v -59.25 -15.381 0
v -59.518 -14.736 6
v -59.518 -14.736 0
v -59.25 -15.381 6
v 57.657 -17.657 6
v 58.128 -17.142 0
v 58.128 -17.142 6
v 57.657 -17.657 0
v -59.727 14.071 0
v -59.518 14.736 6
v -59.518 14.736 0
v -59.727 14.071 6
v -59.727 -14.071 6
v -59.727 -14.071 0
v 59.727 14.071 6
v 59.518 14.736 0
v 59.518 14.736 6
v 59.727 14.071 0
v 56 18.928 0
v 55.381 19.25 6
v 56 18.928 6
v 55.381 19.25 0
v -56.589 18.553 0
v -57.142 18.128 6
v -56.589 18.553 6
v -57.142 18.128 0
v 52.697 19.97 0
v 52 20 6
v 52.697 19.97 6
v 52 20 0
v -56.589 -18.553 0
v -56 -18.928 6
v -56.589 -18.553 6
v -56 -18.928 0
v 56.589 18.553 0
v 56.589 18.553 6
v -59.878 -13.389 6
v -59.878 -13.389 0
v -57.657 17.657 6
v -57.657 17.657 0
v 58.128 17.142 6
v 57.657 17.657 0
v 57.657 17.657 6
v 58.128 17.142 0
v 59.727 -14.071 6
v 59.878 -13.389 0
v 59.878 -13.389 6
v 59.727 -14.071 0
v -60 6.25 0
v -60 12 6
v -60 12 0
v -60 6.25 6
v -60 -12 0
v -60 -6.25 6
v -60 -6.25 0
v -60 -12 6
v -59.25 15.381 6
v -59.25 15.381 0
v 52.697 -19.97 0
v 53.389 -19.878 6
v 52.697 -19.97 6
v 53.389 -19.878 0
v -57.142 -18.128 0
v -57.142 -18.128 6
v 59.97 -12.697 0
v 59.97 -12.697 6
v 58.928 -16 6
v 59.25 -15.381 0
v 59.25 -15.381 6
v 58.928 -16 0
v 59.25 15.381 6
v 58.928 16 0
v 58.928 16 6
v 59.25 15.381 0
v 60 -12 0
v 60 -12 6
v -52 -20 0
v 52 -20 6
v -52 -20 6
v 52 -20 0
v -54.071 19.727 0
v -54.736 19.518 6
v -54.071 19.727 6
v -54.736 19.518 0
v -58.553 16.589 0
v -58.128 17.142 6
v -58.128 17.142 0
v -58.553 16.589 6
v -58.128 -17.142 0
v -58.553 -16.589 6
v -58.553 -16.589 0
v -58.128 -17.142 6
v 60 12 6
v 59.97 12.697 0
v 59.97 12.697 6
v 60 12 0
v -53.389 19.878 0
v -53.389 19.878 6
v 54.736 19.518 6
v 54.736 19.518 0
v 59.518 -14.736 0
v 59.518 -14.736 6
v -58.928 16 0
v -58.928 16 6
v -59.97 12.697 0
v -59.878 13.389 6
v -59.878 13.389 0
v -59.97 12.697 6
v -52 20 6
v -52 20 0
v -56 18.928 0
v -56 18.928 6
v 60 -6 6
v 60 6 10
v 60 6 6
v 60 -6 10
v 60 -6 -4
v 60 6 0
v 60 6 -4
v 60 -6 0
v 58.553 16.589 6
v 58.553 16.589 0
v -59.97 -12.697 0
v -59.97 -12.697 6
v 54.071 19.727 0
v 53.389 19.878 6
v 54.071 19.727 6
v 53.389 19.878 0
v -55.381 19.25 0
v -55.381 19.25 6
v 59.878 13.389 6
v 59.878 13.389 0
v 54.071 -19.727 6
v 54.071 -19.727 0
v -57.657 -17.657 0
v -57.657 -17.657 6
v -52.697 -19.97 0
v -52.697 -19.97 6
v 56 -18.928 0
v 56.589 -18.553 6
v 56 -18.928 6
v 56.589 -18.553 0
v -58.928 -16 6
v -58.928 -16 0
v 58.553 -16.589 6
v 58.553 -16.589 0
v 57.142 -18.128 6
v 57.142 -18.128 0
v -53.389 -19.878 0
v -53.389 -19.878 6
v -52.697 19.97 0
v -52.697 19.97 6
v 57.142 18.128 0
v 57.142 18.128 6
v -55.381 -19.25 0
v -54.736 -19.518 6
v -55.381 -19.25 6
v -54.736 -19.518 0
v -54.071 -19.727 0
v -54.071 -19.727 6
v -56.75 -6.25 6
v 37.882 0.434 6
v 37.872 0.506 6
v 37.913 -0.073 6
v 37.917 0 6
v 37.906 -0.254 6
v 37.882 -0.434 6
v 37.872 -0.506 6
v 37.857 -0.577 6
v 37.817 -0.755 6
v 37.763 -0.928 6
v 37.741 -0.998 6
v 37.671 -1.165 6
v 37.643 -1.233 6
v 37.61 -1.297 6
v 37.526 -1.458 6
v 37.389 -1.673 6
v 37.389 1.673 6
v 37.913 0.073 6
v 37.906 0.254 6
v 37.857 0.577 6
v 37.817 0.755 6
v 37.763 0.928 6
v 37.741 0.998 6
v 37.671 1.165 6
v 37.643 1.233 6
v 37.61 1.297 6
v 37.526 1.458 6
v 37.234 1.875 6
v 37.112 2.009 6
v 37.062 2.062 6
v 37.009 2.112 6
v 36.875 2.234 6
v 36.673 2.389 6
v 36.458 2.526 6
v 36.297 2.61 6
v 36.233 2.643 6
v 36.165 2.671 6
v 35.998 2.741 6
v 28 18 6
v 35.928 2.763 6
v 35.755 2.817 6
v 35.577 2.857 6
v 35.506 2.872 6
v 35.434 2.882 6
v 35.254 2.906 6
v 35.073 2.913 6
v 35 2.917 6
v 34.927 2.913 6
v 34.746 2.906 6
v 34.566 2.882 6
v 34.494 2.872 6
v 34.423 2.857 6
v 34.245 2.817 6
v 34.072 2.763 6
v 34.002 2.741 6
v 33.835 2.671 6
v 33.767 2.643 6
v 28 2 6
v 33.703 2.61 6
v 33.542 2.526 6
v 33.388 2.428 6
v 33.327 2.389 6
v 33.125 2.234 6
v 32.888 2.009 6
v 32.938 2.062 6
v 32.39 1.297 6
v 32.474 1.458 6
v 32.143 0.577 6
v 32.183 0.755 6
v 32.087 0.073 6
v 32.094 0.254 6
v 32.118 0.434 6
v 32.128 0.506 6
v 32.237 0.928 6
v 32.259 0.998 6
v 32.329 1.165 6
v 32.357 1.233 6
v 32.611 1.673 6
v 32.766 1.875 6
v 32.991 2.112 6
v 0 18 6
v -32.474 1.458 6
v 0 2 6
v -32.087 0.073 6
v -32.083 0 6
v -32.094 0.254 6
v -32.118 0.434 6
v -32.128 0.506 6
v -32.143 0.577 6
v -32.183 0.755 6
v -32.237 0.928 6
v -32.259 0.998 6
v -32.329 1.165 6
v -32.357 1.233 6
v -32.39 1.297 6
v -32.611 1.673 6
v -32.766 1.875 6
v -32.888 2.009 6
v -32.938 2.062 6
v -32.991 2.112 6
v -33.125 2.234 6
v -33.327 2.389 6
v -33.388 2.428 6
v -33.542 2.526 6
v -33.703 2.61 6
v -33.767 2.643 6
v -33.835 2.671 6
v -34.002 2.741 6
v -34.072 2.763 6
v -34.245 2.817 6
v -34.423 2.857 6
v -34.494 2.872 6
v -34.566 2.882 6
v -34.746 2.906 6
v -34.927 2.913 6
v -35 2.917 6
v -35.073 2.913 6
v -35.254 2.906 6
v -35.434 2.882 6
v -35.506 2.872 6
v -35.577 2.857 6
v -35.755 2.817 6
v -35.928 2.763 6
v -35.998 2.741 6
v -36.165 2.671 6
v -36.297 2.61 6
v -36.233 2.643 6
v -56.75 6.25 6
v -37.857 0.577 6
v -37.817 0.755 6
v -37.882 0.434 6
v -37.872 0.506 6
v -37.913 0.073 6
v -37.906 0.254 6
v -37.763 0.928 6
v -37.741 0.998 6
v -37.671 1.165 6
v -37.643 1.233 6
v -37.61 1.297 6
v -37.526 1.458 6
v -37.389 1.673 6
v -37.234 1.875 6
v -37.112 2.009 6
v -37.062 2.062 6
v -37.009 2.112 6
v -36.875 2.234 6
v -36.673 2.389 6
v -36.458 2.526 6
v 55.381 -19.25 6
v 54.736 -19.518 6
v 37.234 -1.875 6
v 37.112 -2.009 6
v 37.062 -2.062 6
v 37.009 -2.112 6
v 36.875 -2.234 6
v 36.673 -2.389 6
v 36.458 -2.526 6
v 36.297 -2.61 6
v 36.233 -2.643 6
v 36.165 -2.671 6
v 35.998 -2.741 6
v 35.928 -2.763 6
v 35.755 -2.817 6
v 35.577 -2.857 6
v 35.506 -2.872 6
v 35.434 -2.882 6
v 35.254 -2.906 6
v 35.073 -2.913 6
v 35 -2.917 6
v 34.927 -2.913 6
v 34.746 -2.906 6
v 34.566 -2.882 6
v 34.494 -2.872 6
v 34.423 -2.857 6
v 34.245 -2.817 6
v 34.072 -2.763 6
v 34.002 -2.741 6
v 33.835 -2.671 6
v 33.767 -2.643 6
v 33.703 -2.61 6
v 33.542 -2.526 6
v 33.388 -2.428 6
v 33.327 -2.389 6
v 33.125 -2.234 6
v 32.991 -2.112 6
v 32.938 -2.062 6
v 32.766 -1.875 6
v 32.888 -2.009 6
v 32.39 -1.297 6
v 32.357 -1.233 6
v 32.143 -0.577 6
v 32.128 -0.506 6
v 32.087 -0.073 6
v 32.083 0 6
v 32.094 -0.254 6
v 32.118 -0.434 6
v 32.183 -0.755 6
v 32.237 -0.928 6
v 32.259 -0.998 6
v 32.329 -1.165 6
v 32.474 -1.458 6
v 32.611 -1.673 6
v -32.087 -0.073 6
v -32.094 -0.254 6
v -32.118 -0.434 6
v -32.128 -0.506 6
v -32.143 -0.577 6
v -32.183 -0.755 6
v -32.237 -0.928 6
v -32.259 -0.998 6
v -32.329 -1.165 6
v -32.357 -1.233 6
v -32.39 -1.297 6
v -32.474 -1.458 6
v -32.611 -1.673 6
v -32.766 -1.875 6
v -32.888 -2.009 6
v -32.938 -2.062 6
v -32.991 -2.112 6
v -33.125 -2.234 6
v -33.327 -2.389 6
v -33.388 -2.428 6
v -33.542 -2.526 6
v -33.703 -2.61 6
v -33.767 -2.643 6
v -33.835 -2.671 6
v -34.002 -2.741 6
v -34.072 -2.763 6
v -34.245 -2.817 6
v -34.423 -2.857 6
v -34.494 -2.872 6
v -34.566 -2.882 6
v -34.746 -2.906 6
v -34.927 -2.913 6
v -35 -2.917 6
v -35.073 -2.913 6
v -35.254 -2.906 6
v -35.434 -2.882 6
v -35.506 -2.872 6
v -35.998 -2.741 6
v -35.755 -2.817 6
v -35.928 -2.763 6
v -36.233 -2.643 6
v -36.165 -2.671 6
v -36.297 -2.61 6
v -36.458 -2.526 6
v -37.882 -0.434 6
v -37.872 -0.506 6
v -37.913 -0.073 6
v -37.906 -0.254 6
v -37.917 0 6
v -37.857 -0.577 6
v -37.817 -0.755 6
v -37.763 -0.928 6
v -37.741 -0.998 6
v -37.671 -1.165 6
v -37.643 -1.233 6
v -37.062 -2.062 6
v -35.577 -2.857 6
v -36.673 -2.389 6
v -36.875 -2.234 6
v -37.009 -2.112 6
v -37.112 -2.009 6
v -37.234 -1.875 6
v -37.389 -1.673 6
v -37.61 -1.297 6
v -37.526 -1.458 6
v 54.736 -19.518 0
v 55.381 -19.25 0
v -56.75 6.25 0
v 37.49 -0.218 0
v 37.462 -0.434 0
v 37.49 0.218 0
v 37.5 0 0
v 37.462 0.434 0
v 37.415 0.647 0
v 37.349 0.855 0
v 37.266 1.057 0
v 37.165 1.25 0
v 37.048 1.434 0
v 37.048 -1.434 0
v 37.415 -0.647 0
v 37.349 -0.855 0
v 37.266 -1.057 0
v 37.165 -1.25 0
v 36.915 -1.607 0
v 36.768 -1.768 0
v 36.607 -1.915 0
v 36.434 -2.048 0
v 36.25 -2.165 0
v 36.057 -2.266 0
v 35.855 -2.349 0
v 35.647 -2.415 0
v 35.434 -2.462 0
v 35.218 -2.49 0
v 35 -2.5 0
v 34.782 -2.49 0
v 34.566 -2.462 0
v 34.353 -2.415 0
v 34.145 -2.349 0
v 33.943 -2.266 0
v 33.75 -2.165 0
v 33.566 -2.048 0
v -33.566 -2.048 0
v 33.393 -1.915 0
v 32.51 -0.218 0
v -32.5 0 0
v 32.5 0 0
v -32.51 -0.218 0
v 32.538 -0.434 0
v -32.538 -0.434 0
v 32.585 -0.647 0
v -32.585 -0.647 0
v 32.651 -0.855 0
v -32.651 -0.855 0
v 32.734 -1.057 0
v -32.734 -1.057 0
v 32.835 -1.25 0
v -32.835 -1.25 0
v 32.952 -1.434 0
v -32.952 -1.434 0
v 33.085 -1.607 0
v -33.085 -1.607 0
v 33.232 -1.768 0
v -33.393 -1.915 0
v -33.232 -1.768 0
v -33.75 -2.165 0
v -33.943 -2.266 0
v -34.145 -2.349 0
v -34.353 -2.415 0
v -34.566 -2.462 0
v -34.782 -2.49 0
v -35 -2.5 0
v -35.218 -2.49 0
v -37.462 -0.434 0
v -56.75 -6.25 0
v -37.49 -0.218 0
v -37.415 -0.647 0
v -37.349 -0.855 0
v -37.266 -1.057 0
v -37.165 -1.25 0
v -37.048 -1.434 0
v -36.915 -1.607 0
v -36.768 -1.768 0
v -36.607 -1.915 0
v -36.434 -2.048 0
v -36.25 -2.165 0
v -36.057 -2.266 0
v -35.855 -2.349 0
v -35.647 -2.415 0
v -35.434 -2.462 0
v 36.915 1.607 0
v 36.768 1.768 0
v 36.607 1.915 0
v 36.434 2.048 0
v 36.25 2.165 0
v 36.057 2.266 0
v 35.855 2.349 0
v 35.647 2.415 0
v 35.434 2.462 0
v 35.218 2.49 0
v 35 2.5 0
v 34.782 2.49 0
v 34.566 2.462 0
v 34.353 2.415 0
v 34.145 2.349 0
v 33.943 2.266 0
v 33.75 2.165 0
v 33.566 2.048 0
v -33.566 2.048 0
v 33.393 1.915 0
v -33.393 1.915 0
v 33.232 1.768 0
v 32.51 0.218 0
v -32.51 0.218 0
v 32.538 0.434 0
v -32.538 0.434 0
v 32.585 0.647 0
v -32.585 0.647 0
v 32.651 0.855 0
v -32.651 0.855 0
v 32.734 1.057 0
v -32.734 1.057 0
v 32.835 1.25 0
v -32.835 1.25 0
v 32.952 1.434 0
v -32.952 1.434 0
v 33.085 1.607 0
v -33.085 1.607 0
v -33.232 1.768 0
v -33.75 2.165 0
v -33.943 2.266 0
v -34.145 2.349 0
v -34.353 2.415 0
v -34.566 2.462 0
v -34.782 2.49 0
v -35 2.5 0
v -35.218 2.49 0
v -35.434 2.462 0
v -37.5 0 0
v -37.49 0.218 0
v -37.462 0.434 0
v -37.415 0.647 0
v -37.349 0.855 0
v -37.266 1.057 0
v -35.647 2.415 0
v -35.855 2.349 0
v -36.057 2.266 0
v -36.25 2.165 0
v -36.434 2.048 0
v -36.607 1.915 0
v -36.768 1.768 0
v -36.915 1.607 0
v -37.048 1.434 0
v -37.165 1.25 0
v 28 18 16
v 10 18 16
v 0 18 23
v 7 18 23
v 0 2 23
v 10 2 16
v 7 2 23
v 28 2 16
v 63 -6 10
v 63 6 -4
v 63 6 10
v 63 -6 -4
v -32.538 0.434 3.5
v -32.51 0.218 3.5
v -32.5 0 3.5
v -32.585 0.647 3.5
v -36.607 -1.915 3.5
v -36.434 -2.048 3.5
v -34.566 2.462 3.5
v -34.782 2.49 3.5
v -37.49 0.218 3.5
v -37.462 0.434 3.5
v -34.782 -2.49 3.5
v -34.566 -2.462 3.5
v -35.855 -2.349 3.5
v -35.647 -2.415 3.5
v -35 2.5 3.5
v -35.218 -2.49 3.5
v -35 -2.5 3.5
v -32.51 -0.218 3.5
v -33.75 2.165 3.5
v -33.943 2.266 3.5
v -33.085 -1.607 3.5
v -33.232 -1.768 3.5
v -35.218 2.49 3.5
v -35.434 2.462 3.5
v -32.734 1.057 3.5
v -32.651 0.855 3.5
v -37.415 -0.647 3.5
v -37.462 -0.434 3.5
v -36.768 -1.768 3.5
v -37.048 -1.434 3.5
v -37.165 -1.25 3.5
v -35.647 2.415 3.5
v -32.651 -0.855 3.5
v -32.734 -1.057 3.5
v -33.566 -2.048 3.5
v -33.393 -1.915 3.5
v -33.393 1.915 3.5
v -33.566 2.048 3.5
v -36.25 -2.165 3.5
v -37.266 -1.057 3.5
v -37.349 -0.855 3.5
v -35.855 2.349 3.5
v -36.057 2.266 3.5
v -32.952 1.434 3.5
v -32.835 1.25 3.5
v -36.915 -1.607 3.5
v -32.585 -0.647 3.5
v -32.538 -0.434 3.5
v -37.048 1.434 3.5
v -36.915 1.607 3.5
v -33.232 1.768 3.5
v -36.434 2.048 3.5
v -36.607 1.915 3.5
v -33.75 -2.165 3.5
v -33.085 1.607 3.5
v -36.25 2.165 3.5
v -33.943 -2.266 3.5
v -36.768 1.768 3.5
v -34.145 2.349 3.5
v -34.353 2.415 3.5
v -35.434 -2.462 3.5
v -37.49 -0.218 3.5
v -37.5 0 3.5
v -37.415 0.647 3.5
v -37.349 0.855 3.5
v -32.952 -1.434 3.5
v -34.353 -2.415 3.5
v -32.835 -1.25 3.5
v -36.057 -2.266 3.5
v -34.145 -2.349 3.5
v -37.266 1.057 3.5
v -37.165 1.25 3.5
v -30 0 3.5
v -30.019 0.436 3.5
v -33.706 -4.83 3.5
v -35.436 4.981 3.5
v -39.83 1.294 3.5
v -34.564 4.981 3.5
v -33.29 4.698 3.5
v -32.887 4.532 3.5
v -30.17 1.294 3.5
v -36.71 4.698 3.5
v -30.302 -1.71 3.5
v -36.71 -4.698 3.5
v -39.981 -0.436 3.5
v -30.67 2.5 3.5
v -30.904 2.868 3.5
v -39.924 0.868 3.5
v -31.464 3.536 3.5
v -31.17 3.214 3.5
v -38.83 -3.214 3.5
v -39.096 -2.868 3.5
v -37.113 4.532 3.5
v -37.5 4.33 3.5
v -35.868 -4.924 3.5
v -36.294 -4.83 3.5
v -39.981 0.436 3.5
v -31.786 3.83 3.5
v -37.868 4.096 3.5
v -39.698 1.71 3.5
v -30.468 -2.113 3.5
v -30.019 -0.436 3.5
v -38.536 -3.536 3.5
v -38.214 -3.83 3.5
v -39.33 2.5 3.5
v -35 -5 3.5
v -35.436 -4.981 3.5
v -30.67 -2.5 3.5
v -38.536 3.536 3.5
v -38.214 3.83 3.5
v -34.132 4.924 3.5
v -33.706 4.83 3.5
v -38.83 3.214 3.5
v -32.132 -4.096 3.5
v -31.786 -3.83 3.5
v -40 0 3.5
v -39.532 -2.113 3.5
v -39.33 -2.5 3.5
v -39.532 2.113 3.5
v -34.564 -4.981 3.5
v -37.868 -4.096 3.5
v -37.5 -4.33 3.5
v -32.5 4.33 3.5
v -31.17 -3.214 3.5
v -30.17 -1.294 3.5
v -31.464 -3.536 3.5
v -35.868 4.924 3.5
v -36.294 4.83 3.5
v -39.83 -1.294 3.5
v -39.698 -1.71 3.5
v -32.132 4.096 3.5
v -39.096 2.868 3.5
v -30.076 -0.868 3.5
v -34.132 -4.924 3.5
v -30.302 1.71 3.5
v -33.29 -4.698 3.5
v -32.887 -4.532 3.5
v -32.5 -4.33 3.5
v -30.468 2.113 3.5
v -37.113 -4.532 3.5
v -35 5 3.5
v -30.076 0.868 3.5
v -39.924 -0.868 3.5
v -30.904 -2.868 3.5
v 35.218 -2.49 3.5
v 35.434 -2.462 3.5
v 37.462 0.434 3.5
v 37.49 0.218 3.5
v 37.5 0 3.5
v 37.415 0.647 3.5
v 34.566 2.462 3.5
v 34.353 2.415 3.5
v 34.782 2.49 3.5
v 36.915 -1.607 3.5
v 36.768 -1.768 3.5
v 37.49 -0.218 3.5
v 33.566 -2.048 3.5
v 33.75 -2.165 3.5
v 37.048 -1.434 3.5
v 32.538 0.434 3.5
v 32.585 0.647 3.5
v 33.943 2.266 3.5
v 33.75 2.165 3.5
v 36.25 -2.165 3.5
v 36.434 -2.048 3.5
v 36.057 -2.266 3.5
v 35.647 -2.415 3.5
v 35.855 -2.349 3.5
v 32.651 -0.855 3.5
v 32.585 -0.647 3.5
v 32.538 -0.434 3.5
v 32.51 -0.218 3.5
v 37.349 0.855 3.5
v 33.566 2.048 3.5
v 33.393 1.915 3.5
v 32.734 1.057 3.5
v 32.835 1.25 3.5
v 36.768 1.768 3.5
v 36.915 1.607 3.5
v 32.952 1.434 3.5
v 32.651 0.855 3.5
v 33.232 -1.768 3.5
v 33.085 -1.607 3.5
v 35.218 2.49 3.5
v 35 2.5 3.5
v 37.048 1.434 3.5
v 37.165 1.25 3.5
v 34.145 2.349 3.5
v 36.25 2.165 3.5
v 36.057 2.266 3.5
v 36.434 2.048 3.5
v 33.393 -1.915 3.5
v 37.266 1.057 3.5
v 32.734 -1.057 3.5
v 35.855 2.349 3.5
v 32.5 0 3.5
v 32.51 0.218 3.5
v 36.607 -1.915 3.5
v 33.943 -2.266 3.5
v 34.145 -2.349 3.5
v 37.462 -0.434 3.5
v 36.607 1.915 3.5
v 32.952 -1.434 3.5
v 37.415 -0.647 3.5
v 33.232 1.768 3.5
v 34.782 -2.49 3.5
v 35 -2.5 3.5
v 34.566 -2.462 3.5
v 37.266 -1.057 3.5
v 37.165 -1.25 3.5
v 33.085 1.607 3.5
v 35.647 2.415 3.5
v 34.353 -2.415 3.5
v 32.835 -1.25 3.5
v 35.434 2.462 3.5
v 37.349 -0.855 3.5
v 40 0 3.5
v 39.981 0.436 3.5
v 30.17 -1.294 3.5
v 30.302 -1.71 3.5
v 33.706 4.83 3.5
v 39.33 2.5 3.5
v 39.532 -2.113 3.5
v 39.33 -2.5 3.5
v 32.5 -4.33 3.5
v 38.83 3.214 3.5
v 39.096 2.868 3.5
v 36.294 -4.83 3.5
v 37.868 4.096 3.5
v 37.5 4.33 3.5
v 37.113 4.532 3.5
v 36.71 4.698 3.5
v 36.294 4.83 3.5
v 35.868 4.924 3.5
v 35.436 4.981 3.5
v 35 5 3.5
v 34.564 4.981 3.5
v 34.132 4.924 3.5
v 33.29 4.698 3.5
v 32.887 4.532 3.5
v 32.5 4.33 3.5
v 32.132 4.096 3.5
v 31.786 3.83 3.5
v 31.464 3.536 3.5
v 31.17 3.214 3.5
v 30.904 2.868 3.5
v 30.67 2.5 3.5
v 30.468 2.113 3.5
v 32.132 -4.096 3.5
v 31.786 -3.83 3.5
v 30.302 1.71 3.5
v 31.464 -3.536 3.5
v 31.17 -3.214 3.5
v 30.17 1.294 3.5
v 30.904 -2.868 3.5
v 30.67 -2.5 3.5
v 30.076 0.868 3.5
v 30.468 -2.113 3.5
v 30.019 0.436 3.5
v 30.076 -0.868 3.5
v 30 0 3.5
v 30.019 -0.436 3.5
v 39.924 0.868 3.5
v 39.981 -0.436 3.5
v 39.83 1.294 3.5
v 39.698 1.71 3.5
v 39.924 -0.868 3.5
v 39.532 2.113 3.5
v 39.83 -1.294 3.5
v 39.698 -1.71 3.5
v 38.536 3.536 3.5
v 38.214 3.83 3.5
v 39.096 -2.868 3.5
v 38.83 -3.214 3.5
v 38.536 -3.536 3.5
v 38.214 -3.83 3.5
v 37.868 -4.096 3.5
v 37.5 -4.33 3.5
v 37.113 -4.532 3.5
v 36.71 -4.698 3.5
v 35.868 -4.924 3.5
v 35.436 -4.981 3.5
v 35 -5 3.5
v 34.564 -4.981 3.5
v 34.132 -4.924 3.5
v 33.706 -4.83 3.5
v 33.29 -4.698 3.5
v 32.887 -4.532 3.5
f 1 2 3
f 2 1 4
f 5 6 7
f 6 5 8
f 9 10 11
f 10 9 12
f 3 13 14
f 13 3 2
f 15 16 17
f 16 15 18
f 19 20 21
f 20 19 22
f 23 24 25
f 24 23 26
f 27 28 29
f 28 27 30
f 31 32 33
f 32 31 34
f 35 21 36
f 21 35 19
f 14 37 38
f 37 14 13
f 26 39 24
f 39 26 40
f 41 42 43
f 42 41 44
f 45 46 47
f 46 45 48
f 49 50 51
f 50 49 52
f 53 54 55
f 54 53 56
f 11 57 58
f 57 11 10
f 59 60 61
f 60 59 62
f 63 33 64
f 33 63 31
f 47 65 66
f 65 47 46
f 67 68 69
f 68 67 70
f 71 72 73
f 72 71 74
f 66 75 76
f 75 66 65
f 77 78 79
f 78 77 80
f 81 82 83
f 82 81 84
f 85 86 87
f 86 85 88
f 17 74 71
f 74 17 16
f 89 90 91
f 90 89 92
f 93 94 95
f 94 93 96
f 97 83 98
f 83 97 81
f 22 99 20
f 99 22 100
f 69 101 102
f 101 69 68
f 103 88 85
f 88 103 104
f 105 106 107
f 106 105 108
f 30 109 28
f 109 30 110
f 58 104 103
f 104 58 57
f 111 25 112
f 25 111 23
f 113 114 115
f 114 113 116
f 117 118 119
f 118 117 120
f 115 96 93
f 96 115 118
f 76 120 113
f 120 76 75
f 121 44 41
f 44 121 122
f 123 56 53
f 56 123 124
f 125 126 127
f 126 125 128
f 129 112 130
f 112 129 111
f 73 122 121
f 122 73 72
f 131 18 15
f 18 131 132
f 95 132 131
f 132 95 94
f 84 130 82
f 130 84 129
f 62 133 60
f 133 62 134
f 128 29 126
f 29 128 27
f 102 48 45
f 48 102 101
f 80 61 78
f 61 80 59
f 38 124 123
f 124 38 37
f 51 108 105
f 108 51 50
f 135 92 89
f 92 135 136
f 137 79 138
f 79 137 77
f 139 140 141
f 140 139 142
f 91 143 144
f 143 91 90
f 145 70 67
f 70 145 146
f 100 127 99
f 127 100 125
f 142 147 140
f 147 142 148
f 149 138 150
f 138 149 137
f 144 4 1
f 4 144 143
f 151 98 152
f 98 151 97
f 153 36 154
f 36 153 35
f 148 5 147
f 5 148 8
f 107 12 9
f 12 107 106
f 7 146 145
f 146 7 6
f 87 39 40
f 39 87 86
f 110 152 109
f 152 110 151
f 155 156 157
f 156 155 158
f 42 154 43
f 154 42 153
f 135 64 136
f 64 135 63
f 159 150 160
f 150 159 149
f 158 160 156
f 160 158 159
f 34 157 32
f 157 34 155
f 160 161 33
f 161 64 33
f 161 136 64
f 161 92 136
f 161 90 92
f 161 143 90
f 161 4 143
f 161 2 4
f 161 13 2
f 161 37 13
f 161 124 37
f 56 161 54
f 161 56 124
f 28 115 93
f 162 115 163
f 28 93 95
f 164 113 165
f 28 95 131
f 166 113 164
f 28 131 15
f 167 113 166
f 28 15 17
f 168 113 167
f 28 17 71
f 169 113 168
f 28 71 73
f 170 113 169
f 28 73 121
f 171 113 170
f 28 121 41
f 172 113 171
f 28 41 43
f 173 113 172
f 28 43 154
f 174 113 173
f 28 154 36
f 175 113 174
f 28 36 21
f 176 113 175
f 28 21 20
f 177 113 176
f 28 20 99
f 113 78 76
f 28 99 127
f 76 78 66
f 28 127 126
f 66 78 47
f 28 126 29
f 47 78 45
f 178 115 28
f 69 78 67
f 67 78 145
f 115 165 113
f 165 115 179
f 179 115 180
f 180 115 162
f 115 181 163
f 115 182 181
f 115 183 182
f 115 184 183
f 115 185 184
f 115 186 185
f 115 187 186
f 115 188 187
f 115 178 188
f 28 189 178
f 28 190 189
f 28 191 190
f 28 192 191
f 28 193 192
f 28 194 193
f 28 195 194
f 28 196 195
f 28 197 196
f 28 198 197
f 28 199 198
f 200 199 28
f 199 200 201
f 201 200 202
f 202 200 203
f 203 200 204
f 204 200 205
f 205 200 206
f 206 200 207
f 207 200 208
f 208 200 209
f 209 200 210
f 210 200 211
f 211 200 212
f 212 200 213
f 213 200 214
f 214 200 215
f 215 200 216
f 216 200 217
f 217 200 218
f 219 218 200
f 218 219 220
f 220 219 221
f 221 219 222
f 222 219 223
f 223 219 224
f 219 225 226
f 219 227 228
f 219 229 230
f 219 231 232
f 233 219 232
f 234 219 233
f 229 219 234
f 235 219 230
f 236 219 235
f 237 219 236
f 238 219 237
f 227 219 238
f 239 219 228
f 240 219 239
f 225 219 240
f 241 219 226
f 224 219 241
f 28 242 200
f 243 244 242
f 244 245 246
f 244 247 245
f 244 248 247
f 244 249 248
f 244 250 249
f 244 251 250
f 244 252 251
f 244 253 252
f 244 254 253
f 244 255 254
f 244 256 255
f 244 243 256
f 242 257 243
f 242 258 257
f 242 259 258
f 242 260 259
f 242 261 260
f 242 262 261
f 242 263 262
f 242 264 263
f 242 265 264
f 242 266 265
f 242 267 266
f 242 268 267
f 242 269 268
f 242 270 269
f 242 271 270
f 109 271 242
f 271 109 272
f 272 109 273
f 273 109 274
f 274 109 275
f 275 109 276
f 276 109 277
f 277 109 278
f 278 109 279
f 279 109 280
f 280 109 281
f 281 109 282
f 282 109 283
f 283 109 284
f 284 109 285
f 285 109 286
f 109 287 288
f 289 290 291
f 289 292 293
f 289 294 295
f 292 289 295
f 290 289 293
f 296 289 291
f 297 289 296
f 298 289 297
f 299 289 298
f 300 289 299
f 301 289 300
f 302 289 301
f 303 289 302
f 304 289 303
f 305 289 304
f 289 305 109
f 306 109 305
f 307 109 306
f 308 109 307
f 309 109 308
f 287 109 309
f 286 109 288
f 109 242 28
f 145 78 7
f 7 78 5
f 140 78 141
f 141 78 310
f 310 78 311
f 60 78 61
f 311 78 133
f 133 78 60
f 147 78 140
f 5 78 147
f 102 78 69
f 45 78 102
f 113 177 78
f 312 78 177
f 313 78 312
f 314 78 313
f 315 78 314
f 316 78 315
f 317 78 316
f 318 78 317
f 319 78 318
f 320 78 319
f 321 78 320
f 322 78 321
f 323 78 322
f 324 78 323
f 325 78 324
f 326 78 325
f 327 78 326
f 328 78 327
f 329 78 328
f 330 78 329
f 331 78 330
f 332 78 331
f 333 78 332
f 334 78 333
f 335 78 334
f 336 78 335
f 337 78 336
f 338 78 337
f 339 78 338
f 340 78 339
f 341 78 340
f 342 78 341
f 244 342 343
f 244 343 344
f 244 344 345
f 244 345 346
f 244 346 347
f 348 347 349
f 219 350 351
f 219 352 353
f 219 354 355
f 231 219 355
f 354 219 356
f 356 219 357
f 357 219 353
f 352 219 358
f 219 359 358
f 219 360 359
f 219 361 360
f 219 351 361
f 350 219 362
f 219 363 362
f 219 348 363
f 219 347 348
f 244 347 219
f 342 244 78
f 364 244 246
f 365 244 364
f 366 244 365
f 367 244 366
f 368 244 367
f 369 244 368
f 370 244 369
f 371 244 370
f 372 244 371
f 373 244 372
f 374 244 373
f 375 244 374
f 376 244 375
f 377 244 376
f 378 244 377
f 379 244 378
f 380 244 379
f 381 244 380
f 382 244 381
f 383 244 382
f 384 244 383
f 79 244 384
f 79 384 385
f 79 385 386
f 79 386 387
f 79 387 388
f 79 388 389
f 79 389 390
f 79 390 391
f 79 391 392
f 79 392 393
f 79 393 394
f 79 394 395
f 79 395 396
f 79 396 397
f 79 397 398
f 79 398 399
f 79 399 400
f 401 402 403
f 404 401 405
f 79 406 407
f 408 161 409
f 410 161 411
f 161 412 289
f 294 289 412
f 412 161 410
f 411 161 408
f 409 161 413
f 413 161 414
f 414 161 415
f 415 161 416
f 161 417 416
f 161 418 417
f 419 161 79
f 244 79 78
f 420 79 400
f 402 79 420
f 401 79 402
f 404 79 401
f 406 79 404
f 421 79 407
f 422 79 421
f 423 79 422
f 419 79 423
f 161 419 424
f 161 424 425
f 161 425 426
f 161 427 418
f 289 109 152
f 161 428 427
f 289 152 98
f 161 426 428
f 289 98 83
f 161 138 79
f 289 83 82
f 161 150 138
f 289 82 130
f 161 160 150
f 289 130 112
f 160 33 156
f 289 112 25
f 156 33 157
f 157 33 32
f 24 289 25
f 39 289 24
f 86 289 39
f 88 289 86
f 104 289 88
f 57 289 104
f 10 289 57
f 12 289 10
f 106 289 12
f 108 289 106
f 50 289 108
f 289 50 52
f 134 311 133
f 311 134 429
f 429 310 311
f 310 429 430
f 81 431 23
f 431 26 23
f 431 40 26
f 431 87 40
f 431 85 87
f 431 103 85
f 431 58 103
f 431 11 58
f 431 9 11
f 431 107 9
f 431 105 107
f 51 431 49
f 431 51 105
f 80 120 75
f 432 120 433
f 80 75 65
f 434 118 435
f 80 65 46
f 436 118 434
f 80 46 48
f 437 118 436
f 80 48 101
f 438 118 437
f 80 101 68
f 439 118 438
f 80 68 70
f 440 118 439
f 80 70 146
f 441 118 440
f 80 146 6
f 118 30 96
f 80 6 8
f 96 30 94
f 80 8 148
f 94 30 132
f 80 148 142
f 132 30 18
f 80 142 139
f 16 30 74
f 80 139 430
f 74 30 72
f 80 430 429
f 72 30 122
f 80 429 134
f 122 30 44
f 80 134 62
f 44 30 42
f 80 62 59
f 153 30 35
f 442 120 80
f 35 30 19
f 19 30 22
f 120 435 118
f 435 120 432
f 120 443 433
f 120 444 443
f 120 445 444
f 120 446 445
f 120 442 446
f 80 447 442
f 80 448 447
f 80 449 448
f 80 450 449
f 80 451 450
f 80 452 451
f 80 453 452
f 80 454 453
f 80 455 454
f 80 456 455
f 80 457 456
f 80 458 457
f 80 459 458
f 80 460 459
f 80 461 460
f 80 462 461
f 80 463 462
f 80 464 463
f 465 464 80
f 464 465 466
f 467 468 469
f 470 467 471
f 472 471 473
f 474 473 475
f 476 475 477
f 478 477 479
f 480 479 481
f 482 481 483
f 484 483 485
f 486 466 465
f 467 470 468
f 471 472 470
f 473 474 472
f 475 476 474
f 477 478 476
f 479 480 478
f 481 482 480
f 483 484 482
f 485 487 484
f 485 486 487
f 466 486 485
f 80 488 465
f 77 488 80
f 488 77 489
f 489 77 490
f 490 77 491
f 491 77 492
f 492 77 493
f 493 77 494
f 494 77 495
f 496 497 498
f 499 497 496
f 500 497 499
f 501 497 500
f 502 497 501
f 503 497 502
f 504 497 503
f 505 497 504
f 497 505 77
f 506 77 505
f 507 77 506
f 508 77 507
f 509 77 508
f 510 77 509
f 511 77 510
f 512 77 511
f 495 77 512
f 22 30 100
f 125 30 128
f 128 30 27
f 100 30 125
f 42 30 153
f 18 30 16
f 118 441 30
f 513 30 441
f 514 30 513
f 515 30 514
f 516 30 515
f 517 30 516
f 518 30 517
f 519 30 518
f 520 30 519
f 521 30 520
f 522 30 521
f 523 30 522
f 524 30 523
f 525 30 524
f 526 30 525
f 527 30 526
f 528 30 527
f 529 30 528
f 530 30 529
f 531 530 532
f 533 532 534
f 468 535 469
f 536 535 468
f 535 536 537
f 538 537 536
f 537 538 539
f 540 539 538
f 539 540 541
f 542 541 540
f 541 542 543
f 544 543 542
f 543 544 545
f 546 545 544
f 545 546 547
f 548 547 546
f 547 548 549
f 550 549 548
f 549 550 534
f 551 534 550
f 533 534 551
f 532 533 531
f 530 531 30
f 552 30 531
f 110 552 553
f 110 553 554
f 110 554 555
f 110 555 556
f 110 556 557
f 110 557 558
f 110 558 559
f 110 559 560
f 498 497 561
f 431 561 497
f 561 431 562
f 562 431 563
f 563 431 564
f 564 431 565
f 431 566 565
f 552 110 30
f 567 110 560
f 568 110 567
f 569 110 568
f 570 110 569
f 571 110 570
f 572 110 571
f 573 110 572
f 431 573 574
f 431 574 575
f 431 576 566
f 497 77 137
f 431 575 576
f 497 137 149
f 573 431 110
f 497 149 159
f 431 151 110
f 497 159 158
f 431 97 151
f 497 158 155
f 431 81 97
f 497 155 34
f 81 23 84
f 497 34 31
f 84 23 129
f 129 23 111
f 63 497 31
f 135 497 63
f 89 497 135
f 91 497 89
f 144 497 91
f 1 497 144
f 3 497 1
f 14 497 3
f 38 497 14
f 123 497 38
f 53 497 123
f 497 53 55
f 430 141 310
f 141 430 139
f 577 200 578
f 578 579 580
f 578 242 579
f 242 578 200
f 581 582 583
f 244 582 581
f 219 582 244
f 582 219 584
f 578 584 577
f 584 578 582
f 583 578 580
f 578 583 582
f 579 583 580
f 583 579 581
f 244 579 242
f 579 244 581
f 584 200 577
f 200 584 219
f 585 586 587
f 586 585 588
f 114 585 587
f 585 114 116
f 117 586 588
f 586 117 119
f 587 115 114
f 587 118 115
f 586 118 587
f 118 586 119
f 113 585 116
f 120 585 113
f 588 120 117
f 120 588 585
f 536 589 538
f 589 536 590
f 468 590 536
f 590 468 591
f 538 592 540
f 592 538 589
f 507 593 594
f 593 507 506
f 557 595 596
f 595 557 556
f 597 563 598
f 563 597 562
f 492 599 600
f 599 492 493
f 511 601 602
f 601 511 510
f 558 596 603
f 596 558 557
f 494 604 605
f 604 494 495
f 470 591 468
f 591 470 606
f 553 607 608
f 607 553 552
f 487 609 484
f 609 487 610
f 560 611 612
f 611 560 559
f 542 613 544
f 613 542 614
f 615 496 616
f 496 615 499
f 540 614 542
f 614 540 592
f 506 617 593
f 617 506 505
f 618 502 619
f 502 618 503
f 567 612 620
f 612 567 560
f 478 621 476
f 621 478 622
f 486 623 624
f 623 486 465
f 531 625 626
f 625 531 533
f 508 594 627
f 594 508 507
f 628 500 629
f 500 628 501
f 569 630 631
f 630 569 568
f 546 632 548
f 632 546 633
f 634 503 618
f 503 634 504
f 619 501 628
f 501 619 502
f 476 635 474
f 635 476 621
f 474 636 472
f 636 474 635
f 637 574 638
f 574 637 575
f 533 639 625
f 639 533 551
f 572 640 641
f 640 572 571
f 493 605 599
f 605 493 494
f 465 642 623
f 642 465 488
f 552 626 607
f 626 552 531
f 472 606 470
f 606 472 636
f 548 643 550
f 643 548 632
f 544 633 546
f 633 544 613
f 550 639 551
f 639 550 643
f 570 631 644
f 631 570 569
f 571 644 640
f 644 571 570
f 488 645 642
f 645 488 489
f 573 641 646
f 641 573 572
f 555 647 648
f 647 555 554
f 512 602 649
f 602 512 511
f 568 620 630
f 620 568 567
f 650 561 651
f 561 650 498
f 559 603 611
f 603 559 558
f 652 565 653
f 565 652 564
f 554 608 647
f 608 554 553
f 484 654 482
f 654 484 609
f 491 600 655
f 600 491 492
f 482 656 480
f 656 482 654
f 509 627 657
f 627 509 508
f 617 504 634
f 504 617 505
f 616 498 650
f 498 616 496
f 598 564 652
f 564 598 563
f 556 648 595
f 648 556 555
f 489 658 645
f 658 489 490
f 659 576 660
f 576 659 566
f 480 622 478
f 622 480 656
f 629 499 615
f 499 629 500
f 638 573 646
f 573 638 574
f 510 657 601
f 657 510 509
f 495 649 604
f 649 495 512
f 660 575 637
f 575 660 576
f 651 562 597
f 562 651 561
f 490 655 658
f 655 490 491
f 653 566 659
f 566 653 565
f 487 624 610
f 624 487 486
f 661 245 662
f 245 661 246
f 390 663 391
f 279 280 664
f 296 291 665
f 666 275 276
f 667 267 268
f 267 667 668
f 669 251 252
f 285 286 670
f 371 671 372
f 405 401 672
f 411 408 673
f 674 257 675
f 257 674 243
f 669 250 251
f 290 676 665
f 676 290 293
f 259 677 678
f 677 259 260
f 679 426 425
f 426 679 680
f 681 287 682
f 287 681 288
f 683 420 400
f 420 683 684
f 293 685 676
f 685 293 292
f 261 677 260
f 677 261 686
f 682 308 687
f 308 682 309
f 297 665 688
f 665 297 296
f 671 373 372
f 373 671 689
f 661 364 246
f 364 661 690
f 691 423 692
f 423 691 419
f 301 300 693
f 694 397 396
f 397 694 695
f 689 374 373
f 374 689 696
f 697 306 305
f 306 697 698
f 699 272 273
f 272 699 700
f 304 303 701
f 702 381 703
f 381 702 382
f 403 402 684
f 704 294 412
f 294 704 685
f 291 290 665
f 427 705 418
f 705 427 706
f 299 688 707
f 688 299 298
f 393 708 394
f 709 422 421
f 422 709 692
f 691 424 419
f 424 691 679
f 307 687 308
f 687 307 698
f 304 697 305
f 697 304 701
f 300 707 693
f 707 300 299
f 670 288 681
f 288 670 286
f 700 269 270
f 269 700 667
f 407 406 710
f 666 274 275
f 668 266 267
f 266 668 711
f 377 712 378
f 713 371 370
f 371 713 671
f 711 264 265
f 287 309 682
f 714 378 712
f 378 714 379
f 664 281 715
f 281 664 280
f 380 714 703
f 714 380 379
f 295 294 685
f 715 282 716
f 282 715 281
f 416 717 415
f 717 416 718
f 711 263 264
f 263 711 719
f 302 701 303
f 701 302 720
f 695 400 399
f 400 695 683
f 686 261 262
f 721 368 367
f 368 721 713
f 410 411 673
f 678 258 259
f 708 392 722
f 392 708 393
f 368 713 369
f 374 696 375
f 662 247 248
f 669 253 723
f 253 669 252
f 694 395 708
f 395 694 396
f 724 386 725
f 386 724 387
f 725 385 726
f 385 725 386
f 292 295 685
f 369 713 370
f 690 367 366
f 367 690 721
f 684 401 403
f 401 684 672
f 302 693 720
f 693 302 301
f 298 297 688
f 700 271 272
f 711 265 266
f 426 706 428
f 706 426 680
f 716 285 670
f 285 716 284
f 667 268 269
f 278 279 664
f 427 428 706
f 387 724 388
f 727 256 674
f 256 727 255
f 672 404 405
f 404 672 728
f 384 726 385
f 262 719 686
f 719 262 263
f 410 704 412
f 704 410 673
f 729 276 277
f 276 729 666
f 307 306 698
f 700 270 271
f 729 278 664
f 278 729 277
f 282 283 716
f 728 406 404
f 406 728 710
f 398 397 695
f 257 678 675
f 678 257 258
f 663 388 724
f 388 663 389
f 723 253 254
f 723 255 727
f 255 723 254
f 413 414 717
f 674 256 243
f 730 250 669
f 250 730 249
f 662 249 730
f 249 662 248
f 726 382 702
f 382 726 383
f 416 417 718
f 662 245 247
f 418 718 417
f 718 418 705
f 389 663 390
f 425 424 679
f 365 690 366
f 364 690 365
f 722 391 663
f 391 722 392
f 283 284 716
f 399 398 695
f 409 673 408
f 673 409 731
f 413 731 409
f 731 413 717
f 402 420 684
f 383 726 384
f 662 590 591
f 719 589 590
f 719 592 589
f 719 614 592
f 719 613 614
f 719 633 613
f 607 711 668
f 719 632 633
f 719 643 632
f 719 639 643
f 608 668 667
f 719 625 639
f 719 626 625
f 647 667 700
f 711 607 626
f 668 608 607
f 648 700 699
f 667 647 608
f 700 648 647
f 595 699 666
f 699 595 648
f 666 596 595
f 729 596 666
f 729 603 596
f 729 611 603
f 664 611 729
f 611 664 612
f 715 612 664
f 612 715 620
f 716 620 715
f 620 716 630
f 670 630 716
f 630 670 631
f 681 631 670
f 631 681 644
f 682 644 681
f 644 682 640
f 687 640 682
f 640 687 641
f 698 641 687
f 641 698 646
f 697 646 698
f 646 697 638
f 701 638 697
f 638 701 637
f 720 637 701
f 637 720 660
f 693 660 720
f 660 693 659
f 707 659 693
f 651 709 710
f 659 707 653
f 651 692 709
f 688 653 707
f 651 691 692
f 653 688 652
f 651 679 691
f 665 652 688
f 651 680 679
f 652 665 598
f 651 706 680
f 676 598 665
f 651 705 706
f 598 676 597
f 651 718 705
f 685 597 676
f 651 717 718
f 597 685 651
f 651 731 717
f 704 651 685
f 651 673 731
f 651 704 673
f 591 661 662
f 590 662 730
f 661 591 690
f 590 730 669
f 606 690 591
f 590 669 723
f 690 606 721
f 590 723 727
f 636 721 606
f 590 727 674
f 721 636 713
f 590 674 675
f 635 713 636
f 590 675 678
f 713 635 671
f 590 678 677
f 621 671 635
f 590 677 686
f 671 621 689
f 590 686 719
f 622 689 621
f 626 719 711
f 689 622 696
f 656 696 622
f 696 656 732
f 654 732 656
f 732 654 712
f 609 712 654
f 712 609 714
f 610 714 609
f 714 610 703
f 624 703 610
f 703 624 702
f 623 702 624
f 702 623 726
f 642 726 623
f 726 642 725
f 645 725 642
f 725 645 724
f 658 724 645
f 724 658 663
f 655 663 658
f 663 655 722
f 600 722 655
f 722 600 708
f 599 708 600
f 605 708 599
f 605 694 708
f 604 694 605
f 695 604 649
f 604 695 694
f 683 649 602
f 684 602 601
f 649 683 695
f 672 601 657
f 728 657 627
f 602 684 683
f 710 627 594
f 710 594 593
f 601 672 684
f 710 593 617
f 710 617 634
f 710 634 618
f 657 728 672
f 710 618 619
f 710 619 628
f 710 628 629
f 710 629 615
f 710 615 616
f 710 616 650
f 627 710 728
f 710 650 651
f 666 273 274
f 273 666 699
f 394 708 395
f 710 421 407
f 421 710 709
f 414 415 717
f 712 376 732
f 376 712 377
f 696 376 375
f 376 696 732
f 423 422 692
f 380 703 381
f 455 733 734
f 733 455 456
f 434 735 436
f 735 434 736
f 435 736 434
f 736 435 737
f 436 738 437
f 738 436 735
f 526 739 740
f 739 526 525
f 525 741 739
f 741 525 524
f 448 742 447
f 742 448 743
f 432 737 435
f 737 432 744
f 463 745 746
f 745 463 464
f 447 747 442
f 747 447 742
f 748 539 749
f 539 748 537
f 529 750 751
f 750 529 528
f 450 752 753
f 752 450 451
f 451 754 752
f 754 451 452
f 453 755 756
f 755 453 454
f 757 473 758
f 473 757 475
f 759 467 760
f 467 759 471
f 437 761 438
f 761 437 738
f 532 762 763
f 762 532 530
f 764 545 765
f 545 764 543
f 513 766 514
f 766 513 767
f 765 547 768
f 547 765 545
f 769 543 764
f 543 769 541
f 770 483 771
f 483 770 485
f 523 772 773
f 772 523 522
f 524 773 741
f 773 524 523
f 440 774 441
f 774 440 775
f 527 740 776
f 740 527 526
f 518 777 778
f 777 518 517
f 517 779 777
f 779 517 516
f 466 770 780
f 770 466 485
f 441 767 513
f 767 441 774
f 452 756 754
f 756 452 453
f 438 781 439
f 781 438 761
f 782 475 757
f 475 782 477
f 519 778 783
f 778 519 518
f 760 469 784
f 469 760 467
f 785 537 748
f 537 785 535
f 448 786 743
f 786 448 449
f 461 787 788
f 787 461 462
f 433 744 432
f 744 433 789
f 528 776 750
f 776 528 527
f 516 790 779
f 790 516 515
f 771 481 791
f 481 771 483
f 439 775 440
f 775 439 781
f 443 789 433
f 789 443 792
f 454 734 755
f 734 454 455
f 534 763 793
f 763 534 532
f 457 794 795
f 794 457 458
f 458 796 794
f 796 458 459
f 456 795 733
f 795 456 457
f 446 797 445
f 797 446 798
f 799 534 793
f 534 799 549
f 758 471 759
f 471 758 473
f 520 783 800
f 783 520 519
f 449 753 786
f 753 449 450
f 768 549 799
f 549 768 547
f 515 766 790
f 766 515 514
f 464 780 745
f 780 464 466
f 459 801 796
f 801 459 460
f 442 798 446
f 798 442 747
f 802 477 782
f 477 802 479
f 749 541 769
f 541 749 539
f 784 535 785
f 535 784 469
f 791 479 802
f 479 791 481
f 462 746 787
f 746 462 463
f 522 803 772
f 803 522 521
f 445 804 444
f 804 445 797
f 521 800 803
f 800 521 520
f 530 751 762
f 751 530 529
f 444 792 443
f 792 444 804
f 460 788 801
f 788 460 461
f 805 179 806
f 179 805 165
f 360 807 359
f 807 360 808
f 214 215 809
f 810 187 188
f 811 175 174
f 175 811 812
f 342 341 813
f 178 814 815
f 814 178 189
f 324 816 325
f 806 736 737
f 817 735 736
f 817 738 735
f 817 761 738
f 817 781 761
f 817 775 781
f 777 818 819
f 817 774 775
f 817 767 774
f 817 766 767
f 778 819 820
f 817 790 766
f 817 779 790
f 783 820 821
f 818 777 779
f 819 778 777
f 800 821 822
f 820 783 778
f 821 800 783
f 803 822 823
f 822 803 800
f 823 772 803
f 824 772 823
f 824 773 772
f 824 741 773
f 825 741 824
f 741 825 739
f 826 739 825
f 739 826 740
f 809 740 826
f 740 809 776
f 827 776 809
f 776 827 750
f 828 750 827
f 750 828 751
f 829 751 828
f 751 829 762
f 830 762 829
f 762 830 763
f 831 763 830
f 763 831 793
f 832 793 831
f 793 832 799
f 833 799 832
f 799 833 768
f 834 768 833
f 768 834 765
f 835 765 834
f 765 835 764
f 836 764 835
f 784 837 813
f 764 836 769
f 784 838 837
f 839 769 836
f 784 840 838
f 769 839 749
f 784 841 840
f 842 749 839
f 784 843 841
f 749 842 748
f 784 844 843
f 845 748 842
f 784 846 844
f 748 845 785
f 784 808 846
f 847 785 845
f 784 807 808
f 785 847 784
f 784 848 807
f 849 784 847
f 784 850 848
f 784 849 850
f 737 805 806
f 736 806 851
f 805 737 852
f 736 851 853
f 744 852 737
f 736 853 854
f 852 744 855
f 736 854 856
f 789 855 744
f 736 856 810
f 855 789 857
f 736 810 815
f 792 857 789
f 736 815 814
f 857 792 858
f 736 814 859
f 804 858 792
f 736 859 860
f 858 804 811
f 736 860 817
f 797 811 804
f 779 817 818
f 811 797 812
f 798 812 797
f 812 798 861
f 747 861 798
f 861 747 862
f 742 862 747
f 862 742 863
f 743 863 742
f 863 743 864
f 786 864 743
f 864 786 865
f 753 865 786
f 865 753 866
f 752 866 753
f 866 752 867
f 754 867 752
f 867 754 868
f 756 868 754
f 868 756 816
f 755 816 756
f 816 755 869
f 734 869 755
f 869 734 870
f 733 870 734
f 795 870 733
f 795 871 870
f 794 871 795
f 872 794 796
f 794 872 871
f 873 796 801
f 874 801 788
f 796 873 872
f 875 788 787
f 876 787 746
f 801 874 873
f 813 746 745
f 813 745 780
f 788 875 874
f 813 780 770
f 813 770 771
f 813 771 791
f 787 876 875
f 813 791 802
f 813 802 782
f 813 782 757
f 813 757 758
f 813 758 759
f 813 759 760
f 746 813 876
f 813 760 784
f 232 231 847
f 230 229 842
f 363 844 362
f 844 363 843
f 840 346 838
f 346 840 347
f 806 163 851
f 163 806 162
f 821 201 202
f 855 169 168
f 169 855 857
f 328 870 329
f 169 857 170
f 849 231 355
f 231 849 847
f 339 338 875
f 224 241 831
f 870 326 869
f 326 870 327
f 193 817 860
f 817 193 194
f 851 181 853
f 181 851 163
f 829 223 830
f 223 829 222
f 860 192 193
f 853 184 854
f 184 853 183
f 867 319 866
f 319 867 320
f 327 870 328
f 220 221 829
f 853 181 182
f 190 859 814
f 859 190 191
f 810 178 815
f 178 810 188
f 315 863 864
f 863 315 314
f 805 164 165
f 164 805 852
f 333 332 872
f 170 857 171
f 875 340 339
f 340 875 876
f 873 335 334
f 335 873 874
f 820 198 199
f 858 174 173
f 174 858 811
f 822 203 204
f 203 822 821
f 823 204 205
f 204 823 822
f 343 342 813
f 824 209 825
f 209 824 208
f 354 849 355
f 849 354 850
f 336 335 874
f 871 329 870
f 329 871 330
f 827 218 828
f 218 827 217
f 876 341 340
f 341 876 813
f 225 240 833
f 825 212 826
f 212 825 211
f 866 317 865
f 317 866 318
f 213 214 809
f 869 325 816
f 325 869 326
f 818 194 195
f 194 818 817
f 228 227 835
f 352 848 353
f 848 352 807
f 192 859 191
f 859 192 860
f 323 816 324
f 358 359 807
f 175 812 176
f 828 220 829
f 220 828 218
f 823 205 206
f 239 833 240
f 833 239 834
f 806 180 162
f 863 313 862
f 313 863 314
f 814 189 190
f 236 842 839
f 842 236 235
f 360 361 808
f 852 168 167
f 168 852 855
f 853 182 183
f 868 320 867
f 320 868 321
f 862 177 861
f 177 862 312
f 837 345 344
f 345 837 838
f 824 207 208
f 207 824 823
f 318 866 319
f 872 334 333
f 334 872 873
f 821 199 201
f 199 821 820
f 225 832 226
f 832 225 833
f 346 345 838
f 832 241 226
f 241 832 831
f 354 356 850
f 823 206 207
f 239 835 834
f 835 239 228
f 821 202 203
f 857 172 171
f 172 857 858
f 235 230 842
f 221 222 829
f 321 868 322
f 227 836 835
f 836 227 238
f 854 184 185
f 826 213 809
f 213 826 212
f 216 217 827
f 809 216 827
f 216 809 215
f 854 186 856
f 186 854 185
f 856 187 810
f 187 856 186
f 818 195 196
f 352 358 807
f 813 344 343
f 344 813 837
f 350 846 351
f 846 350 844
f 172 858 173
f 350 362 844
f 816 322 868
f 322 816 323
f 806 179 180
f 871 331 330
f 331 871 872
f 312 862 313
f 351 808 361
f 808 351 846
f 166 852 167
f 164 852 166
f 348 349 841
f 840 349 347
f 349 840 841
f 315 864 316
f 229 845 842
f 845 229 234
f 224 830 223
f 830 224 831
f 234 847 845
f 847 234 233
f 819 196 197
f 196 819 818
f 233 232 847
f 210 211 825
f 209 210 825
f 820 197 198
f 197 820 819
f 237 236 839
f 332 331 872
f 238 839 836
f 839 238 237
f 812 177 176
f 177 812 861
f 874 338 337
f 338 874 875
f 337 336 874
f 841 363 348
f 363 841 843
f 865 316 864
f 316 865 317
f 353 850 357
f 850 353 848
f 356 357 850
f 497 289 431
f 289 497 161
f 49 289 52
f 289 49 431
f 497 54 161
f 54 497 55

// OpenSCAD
// TS-PET-B04 - Modular Wall Hook Rail Segment
$fn = 72; rail_w = 120; rail_h = 40; rail_t = 6; tab_w = 12; tab_t = 3; tab_h = 14; hook_proj = 28; hook_w = 16; hook_t = 10; screw_d = 5; head_d = 10;
module base_2d() { hull() { translate([-rail_w/2 + 8, -rail_h/2 + 8]) circle(r = 8); translate([ rail_w/2 - 8, -rail_h/2 + 8]) circle(r = 8); translate([-rail_w/2 + 8,  rail_h/2 - 8]) circle(r = 8); translate([ rail_w/2 - 8,  rail_h/2 - 8]) circle(r = 8); } }
module hook_profile() { polygon(points = [[0,0],[hook_proj,0],[hook_proj,hook_t],[10,hook_t],[7,hook_t + 7],[0,hook_t + 7]]); }
difference() { union() { linear_extrude(height = rail_t) base_2d(); translate([0, rail_h/2 - 10, rail_t]) rotate([90,0,0]) linear_extrude(height = hook_w, center = true) hook_profile(); translate([rail_w/2 + tab_t/2, 0, rail_t/2]) cube([tab_t, tab_w, tab_h], center = true); }
translate([-rail_w/2 + tab_t/2, 0, rail_t/2]) cube([tab_t + 0.5, tab_w + 0.5, tab_h + 0.5], center = true);
for (x = [-35,35]) { translate([x,0,-1]) cylinder(h = rail_t + 2, d = screw_d); translate([x,0,rail_t - 2.5]) cylinder(h = 3, d1 = head_d, d2 = screw_d); } }
